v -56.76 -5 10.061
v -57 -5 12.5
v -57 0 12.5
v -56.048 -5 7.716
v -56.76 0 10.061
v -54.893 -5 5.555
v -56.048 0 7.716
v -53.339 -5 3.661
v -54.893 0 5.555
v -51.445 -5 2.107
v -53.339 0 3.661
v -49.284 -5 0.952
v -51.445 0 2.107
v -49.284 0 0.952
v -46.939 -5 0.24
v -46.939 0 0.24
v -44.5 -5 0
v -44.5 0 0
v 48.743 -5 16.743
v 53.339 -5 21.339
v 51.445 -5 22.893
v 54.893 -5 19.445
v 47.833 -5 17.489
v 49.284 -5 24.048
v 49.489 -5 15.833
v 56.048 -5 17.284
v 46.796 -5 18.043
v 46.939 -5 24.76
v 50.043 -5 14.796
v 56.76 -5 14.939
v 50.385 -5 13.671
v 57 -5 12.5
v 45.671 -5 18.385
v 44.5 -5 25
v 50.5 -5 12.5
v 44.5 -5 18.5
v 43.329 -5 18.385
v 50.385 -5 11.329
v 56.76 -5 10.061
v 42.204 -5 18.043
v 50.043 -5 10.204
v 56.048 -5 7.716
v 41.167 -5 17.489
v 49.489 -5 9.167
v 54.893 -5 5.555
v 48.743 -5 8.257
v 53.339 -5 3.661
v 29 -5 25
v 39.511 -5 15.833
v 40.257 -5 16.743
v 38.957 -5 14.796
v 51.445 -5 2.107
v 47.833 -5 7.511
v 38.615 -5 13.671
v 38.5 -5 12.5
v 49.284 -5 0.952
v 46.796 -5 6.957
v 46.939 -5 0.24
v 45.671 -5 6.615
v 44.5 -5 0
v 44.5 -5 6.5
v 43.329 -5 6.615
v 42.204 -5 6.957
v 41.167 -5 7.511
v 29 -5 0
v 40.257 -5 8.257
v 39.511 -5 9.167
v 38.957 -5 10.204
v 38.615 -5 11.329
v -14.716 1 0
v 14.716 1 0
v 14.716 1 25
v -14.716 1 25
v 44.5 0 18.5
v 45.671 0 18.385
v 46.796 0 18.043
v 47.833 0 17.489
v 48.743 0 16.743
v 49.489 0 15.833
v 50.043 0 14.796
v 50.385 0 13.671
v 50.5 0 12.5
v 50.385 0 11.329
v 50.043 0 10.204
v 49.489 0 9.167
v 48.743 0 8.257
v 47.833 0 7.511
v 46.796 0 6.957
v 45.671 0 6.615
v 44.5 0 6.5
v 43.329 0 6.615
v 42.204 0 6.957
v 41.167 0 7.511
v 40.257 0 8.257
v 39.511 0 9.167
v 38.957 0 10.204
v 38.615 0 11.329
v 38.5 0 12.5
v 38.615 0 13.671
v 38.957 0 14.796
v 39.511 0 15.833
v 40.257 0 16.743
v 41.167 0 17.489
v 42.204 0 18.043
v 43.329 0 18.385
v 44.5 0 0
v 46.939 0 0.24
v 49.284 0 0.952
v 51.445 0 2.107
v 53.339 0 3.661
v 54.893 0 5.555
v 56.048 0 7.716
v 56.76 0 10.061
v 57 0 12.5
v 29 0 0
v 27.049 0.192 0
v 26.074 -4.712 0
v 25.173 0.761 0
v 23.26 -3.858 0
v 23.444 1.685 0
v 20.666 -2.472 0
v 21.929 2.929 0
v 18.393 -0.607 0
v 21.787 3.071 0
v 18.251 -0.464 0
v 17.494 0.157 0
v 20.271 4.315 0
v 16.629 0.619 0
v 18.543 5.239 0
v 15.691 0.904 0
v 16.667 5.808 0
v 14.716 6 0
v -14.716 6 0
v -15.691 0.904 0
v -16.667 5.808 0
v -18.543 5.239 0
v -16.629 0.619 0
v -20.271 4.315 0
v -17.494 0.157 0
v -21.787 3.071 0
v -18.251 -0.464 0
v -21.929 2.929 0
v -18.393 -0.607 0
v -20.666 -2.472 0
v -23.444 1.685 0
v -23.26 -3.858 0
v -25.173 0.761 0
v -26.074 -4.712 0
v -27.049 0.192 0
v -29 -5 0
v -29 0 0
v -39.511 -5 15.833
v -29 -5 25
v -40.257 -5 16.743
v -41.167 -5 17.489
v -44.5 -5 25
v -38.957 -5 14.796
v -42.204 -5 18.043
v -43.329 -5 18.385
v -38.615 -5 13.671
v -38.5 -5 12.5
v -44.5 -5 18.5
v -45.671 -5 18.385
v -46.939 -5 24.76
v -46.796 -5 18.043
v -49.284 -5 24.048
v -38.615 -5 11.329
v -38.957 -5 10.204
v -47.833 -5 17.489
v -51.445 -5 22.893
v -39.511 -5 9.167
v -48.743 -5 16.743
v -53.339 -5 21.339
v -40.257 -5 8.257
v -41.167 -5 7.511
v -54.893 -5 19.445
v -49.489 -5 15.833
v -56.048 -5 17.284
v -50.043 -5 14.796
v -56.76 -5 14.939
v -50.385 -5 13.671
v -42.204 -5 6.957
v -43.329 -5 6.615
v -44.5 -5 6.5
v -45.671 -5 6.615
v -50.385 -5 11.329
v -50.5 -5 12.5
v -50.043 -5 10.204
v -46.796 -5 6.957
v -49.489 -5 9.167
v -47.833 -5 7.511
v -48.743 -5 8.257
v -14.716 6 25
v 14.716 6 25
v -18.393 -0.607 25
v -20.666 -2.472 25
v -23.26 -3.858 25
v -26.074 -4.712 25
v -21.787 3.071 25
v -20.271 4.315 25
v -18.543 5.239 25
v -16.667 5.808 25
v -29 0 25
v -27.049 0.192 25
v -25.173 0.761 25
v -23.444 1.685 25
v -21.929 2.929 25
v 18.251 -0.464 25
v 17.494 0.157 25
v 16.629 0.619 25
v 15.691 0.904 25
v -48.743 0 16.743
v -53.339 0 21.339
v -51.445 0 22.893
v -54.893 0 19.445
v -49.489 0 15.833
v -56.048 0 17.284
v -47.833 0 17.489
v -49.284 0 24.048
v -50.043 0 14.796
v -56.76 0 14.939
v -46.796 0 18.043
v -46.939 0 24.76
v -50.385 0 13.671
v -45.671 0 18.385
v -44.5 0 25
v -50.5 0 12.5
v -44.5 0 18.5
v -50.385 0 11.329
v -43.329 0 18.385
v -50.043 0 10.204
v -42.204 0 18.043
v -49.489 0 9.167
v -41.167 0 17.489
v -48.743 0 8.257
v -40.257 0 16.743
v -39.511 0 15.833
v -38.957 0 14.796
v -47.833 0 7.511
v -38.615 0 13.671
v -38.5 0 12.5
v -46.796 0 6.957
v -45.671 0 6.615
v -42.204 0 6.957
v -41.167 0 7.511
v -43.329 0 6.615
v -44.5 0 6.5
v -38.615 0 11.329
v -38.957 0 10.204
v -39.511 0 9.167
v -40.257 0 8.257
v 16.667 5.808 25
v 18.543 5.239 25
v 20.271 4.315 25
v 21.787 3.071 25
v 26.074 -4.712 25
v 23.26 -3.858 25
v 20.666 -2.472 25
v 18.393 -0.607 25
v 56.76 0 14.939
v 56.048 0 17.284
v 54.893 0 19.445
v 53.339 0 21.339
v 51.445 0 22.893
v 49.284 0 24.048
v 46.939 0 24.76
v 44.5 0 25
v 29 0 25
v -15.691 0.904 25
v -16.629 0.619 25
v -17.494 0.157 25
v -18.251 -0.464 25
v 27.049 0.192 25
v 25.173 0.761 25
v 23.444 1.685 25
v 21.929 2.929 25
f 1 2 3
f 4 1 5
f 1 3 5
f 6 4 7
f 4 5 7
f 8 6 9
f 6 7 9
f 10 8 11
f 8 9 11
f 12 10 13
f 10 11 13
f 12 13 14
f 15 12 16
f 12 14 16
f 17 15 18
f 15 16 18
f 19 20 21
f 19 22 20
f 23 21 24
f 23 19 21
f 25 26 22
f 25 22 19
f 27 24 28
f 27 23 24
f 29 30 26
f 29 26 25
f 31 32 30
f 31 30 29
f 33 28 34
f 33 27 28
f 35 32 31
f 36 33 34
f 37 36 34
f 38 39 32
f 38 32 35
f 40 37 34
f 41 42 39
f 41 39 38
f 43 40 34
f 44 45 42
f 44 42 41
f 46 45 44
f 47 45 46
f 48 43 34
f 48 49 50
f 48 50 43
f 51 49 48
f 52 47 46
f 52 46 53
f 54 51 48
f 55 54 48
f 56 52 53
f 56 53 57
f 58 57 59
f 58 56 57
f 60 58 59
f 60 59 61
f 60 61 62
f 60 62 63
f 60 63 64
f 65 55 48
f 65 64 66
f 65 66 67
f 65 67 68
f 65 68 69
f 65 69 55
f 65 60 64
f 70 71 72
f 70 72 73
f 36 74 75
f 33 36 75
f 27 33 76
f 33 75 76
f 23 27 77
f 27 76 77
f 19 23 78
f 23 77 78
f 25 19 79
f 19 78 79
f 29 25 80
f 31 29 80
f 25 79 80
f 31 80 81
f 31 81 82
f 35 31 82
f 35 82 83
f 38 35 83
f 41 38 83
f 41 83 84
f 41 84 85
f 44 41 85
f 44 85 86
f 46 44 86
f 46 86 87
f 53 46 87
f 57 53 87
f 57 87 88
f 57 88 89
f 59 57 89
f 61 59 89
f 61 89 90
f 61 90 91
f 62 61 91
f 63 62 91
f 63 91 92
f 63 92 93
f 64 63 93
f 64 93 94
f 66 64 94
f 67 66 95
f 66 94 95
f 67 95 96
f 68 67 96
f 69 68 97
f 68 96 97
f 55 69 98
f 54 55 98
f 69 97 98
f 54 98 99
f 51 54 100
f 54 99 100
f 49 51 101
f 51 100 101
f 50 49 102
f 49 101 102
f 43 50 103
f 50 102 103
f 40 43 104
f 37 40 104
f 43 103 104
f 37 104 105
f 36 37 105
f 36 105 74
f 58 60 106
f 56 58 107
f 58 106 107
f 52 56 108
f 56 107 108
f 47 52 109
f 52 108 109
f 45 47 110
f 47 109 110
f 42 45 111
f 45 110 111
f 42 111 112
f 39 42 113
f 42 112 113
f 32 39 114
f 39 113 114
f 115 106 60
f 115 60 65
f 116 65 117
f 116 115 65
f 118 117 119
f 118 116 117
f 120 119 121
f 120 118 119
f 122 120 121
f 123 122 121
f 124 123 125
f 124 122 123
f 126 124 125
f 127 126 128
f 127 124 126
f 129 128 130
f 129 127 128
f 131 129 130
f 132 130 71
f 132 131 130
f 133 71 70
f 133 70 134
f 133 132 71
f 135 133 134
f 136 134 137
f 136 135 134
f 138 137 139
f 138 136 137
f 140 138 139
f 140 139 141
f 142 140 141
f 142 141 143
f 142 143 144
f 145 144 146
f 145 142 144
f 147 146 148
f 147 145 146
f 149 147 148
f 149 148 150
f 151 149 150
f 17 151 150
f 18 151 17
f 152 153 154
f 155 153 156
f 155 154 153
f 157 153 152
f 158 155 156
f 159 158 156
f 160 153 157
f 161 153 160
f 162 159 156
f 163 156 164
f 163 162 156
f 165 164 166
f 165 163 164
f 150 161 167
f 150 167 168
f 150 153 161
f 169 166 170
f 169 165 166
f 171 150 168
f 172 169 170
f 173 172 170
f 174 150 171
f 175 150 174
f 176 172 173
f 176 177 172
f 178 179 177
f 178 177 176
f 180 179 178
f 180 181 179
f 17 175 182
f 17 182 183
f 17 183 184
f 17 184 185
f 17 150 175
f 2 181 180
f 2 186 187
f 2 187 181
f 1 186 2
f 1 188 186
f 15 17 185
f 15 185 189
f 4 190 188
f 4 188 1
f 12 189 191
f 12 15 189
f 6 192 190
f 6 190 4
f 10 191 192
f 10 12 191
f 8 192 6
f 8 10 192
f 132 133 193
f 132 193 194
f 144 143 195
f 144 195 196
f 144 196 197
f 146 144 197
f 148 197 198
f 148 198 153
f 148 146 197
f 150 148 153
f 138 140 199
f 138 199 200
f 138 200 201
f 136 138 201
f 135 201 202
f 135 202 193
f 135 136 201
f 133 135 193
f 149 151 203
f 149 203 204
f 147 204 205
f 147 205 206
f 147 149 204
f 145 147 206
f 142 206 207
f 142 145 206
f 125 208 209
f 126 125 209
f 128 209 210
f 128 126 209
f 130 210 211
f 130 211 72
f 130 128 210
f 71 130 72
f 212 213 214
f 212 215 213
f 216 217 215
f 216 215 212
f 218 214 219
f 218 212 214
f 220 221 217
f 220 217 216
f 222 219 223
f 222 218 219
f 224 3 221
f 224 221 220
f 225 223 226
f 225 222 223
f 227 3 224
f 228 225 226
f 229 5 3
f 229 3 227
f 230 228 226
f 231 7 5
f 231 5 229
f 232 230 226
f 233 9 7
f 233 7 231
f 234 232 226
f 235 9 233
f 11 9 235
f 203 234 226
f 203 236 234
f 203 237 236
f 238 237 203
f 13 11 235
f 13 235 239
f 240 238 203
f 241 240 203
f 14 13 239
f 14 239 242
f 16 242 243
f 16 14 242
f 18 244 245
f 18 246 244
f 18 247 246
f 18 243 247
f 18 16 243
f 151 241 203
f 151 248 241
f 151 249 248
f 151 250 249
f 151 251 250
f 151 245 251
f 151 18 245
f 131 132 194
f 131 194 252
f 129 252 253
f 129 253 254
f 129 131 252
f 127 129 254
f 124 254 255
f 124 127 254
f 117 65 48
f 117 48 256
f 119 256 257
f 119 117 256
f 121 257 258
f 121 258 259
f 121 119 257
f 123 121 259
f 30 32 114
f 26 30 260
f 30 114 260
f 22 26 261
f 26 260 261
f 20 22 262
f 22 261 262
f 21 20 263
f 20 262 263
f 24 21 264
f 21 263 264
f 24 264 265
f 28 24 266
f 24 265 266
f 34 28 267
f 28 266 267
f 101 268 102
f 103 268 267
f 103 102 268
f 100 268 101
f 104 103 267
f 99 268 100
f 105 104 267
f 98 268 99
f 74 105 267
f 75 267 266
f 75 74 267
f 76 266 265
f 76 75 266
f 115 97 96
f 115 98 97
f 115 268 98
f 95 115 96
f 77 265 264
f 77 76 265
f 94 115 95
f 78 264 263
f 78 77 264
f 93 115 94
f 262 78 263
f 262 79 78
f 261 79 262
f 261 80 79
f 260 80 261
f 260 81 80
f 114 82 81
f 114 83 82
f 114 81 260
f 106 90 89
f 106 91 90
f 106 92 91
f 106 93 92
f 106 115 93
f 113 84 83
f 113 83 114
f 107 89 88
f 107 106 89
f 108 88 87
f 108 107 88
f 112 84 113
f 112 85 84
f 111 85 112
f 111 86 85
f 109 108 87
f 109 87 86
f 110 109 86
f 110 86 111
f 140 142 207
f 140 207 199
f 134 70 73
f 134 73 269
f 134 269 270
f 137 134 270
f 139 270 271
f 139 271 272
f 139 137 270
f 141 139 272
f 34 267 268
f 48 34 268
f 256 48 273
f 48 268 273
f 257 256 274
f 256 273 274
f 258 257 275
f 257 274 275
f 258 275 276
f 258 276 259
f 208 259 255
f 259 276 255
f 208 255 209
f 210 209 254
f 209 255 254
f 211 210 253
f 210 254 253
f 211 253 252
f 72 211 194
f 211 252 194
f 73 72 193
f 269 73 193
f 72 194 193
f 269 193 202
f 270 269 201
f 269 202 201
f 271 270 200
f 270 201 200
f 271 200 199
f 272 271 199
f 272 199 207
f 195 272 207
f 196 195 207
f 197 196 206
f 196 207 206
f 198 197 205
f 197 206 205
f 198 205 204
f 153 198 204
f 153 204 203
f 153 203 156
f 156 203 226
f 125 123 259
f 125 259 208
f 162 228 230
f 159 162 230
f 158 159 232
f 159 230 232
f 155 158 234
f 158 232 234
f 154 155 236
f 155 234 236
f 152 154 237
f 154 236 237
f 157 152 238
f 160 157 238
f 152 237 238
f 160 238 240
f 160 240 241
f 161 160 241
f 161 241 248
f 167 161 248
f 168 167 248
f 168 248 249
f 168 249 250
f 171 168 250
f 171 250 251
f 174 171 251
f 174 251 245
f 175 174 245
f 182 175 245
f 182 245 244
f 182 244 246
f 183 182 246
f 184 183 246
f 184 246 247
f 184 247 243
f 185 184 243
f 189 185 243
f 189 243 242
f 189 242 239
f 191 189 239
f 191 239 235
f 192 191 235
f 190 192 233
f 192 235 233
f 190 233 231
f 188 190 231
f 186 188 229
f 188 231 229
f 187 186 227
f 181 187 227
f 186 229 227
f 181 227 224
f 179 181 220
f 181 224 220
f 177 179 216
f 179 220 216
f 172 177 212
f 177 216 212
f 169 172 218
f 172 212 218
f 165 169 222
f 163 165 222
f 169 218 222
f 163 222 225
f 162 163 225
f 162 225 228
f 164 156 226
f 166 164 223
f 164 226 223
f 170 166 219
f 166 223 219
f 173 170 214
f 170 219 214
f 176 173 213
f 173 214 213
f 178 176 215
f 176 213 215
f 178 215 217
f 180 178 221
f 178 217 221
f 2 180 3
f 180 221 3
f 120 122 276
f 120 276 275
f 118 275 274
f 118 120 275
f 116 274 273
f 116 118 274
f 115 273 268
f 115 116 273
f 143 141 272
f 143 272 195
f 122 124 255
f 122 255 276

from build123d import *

# Parameters (mm, degrees)
BASE_FLANGE1_DEPTH = 25
SKETCH6_R          = 6
CUT_EXTRUDE1_DEPTH = 10


# Sheet-metal steps are written as plain solids
with BuildPart() as part:
    # Sketch1 → Base-Flange1 (new body)
    with BuildSketch(Plane.XY):
        with BuildLine():
            Line((-57, 0), (-29, 0))
            ThreePointArc((-29, 0), (-25.173165676, 0.761204675), (-21.928932188, 2.928932188))
            Line((-21.928932188, 2.928932188), (-21.786796564, 3.071067812))
            ThreePointArc((-21.786796564, 3.071067812), (-18.542563076, 5.238795325), (-14.715728753, 6))
            Line((-14.715728753, 6), (14.715728753, 6))
            ThreePointArc((14.715728753, 6), (18.542563076, 5.238795325), (21.786796564, 3.071067812))
            Line((21.786796564, 3.071067812), (21.928932188, 2.928932188))
            ThreePointArc((21.928932188, 2.928932188), (25.173165676, 0.761204675), (29, 0))
            Line((29, 0), (57, 0))
            Line((57, 0), (57, -5))
            Line((57, -5), (29, -5))
            ThreePointArc((29, -5), (23.259748515, -3.858192988), (18.393398282, -0.606601718))
            Line((18.393398282, -0.606601718), (18.251262658, -0.464466094))
            ThreePointArc((18.251262658, -0.464466094), (16.629145914, 0.619397663), (14.715728753, 1))
            Line((14.715728753, 1), (-14.715728753, 1))
            ThreePointArc((-14.715728753, 1), (-16.629145914, 0.619397663), (-18.251262658, -0.464466094))
            Line((-18.251262658, -0.464466094), (-18.393398282, -0.606601718))
            ThreePointArc((-18.393398282, -0.606601718), (-23.259748515, -3.858192988), (-29, -5))
            Line((-29, -5), (-57, -5))
            Line((-57, -5), (-57, 0))
        make_face()
    extrude(amount=BASE_FLANGE1_DEPTH)

    # Sketch6 → Cut-Extrude1 (cut)
    with BuildSketch(Plane(origin=(0, 0, 0), x_dir=(1, 0, 0), z_dir=(0, 1, 0))):
        with BuildLine():
            ThreePointArc((-44.5, -25), (-53.338834765, -21.338834765), (-57, -12.5))
            Line((-57, -12.5), (-57, -25))
            Line((-57, -25), (-44.5, -25))
        make_face()
        with BuildLine():
            Line((-44.5, 0), (-57, 0))
            Line((-57, 0), (-57, -12.5))
            ThreePointArc((-57, -12.5), (-53.338834765, -3.661165235), (-44.5, 0))
        make_face()
        with Locations(Location((-44.5, -12.5, 0), (0, 0, 270))):
            Circle(SKETCH6_R)
        with Locations(Location((44.5, -12.5, 0), (0, 0, 270))):
            Circle(SKETCH6_R)
        with BuildLine():
            ThreePointArc((44.5, 0), (53.338834765, -3.661165235), (57, -12.5))
            Line((57, -12.5), (57, 0))
            Line((57, 0), (44.5, 0))
        make_face()
        with BuildLine():
            Line((44.5, -25), (57, -25))
            Line((57, -25), (57, -12.5))
            ThreePointArc((57, -12.5), (53.338834765, -21.338834765), (44.5, -25))
        make_face()
    extrude(amount=-CUT_EXTRUDE1_DEPTH, mode=Mode.SUBTRACT)


solid = part.part
